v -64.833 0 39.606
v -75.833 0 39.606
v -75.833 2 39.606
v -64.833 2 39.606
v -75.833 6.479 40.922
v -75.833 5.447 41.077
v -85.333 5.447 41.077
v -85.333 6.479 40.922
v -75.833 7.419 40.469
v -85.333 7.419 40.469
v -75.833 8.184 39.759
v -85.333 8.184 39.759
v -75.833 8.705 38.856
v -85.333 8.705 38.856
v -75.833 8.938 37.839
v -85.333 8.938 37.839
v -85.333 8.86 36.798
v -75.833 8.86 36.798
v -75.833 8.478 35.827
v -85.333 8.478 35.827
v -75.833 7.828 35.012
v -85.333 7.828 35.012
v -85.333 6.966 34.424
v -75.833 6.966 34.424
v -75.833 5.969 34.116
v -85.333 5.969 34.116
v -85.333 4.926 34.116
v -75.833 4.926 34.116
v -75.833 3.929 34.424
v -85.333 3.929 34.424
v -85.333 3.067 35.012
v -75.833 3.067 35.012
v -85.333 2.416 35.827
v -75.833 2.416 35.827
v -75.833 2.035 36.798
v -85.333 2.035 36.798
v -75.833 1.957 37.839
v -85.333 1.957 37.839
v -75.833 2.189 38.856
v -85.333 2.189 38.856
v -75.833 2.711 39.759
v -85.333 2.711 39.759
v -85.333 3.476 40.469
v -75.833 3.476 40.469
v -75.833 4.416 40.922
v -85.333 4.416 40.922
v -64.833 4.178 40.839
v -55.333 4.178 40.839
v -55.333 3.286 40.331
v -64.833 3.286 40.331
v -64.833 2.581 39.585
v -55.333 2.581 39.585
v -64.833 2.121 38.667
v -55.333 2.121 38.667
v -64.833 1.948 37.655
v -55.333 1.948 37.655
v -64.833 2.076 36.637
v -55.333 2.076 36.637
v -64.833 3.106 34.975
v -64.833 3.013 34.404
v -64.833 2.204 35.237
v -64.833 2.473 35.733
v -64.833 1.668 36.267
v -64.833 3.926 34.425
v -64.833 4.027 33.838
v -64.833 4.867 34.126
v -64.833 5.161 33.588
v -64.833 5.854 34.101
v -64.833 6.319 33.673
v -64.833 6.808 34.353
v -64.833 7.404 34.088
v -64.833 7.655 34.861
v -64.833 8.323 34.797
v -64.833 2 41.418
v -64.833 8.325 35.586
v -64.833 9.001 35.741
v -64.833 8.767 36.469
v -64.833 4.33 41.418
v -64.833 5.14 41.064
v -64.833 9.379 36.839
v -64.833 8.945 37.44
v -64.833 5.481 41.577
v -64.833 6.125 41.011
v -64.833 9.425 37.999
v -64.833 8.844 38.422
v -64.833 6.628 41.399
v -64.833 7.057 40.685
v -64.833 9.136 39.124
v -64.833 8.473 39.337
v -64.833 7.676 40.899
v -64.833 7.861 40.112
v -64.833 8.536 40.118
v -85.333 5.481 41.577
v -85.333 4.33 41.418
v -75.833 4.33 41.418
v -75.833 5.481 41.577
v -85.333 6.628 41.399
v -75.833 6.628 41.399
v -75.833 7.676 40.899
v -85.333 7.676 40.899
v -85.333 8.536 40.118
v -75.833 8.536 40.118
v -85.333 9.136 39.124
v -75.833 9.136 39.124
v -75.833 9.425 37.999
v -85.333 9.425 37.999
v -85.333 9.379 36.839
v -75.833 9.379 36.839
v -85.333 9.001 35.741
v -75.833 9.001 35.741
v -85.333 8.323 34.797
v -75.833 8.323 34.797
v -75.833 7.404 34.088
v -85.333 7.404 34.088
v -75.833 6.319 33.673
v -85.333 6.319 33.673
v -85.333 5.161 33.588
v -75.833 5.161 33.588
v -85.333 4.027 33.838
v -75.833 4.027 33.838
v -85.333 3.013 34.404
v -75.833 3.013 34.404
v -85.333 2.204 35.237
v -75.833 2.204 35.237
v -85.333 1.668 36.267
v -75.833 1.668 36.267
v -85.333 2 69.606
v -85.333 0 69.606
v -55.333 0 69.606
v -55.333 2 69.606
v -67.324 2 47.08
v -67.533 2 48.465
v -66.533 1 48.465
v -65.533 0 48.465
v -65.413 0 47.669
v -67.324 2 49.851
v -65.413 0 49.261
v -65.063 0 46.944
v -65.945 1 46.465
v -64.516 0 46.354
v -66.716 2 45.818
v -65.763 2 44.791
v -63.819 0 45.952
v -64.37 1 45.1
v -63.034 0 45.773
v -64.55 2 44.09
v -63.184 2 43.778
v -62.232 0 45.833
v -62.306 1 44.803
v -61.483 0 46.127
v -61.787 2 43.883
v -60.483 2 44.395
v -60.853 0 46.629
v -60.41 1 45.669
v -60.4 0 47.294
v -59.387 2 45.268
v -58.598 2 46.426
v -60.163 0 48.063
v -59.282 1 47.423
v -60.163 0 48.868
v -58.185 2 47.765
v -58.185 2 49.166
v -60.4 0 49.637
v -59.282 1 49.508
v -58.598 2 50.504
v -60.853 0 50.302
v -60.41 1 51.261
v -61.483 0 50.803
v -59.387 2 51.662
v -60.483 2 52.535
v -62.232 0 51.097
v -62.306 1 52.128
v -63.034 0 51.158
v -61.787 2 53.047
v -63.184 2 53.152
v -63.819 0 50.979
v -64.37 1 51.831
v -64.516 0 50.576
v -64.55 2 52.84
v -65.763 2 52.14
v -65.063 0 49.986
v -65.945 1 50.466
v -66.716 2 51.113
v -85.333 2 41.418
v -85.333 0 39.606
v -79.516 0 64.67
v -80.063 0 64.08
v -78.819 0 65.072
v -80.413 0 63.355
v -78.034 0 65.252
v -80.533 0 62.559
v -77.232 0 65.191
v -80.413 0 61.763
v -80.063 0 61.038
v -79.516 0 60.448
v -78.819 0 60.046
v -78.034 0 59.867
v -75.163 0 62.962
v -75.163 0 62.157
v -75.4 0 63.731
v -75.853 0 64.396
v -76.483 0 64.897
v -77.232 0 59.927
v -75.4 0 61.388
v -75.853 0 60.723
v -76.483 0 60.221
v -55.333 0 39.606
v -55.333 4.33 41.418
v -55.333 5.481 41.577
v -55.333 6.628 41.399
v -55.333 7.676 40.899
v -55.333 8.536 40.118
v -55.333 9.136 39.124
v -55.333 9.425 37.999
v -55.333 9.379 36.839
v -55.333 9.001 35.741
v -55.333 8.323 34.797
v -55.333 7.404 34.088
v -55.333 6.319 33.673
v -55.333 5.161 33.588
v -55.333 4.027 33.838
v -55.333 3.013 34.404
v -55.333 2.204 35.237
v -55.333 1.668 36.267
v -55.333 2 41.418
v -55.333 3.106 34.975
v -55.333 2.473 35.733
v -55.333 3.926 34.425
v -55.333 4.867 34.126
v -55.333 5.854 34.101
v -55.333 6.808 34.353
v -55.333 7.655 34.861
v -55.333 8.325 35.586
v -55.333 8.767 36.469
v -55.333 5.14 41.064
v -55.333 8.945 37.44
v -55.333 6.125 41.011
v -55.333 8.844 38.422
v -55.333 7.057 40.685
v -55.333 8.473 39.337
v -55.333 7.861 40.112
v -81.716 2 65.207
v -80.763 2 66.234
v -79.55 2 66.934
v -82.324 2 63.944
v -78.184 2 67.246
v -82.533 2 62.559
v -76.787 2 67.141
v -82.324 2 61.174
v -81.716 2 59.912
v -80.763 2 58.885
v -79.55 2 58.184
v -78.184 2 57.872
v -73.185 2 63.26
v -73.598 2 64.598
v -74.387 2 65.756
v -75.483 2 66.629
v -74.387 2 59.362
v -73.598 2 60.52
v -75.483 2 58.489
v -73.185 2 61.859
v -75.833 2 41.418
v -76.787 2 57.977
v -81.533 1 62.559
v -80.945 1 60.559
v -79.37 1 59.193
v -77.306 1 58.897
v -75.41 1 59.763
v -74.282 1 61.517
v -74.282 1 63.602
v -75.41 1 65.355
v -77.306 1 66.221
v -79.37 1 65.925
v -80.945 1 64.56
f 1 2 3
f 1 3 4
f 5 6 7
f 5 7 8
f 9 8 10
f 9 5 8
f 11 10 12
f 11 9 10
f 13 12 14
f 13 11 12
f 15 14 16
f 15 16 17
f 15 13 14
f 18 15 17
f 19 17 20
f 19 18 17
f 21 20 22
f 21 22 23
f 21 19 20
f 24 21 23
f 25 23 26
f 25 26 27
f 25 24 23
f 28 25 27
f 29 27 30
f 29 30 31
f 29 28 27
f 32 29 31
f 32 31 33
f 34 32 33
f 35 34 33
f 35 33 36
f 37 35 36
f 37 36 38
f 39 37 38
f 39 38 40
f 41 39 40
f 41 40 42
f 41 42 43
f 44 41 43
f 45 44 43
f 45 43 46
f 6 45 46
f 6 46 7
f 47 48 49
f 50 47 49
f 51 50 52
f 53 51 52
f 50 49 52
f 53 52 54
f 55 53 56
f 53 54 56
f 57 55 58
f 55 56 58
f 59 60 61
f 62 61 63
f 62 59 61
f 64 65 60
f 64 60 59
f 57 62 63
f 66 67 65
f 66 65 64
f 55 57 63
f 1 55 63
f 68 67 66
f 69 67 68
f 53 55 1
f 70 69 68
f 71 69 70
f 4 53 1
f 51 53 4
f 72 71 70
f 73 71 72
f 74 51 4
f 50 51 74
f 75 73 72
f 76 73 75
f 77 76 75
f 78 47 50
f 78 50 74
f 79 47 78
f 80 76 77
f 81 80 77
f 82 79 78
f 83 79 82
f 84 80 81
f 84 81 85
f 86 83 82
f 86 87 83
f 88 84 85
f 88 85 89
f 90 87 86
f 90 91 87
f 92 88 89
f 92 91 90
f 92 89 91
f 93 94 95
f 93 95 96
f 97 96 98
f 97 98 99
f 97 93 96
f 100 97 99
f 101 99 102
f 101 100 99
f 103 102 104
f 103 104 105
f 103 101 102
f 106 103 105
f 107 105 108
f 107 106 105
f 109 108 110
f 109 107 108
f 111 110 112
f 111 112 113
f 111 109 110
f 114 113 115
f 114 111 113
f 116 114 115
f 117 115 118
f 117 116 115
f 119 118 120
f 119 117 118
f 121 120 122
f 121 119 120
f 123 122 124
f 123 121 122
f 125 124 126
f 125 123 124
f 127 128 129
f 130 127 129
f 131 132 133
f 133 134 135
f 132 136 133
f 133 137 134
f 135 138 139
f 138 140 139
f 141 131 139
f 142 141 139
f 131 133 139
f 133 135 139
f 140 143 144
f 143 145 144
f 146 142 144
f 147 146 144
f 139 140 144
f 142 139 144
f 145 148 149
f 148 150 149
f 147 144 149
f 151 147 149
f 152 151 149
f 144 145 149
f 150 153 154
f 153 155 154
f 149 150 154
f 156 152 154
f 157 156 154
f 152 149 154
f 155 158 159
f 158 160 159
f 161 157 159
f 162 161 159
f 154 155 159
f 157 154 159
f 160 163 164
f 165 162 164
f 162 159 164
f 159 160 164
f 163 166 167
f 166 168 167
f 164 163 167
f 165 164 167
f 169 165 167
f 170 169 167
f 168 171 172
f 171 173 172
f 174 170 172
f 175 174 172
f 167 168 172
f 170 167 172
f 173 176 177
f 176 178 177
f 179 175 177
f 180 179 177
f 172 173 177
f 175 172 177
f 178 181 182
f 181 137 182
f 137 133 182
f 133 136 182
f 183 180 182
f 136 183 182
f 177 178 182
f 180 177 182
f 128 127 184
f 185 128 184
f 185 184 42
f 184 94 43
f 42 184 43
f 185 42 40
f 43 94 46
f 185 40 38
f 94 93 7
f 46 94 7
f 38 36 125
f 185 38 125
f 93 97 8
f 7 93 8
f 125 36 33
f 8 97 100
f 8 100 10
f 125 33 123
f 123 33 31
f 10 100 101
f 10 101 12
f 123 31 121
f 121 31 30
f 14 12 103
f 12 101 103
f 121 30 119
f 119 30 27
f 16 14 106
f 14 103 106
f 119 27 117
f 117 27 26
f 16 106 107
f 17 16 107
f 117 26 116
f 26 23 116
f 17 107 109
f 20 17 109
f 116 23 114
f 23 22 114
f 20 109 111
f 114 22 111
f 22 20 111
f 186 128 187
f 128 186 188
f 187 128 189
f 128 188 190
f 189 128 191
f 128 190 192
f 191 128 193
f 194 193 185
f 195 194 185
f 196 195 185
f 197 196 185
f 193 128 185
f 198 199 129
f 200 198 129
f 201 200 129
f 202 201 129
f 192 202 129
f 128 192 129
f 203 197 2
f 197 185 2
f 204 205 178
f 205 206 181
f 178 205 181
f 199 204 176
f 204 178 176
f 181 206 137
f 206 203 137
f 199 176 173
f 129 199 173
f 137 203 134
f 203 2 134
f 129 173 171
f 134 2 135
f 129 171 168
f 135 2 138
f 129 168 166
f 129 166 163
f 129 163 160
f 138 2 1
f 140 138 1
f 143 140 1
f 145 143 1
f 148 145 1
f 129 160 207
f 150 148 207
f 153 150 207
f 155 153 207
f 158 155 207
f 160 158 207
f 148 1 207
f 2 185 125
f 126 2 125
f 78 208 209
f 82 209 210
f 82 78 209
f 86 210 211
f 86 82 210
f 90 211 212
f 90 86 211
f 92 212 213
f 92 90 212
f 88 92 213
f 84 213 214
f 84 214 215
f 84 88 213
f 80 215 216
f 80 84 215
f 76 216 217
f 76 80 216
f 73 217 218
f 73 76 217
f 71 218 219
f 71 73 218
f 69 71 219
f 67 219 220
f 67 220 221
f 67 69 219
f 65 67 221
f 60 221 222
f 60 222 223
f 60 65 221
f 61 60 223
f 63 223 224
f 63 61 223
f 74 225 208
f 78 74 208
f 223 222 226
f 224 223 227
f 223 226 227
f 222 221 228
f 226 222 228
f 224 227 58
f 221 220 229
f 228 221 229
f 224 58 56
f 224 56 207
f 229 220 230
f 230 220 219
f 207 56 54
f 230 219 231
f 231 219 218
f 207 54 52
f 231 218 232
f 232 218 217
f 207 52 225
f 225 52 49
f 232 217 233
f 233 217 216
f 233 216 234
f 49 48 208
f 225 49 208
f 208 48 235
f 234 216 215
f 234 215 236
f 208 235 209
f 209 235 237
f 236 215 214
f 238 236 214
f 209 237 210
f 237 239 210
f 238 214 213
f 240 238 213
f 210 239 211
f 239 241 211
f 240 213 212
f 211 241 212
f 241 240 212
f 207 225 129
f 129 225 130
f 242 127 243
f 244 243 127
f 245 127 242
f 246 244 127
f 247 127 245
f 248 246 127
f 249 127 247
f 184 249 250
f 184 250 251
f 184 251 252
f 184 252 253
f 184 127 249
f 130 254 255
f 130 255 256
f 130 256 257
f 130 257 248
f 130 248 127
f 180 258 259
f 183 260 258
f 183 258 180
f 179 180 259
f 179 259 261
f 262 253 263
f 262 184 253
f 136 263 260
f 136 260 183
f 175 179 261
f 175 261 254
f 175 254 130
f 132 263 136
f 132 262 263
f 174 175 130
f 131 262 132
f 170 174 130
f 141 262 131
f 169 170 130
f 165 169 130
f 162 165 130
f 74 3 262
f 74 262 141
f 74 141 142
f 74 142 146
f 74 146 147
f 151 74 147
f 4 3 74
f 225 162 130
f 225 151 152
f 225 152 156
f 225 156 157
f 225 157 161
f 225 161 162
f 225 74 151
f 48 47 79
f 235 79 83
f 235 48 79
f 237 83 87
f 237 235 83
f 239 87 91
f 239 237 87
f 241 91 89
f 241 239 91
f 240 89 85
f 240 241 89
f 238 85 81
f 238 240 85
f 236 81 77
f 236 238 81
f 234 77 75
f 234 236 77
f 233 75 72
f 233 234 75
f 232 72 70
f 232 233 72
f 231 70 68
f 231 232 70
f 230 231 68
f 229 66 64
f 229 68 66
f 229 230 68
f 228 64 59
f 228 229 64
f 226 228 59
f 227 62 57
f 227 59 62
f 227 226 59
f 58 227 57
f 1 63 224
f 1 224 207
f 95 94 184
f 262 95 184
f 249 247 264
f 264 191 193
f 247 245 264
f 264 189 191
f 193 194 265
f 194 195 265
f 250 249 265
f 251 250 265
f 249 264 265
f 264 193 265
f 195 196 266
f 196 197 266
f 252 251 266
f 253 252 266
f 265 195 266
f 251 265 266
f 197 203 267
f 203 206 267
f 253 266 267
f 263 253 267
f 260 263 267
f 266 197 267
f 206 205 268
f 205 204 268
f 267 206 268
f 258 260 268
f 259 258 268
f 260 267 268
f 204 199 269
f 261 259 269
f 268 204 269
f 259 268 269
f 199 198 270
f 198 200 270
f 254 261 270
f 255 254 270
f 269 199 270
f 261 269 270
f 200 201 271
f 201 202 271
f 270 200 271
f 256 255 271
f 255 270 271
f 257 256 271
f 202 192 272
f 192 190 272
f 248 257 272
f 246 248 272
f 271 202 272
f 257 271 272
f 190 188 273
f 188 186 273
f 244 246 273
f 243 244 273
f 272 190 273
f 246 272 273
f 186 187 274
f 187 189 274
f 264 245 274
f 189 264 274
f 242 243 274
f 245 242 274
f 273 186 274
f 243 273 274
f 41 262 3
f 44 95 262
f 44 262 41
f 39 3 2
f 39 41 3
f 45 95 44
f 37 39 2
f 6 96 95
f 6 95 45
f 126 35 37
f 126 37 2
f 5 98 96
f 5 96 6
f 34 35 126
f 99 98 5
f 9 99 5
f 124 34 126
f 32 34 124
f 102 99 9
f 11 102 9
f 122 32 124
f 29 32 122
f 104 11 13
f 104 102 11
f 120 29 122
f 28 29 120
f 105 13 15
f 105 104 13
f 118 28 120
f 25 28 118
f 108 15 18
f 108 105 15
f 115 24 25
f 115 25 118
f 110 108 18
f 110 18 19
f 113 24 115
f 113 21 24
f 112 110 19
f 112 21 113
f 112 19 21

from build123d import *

# Parameters (mm, degrees)
SKETCH_1_W                  = 30
SKETCH_1_H                  = 30
EXTRUDE_1_DEPTH             = 2
SKETCH_2_R                  = 4
EXTRUDE_2_DEPTH             = 9.5
SKETCH_3_R                  = 4
EXTRUDE_3_DEPTH             = 9.5
CUT_EXTRUDE_START           = -30
SKETCH_4_R                  = 3.5
CUT_EXTRUDE_1_DEPTH         = 30
EXTRUDE_4_DEPTH             = 9.5
EXTRUDE_START               = -9.5
EXTRUDE_5_DEPTH             = 9.5
HOLE_WIZARD_M41_D           = 4.5
HOLE_WIZARD_M41_DEPTH       = 21
HOLE_WIZARD_M41_CSINK_D     = 9.4
HOLE_WIZARD_M41_CSINK_ANGLE = 90
HOLE_WIZARD_M41_TIP         = 1.351936393


with BuildPart() as part:
    # Эскиз1 → Бобышка-Вытянуть1 (new body)
    with BuildSketch(Plane(origin=(0, 0, 0), x_dir=(1, 0, 0), z_dir=(0, 1, 0))):
        with Locations((-70.332590066, -54.606104746)):
            Rectangle(SKETCH_1_W, SKETCH_1_H)
    extrude(amount=EXTRUDE_1_DEPTH)



with BuildPart() as body_2:
    # Эскиз2 → Бобышка-Вытянуть2 (new body)
    with BuildSketch(Plane.ZY.offset(85.332590066)):
        with Locations((37.577272985, 5.447294836)):
            Circle(SKETCH_2_R)
    extrude(amount=-EXTRUDE_2_DEPTH)


with BuildPart() as body_3:
    # Эскиз3 → Бобышка-Вытянуть3 (new body)
    with BuildSketch(Plane.ZY.offset(64.832590066)):
        with Locations((37.577272985, 5.447294836)):
            Circle(SKETCH_3_R)
    extrude(amount=-EXTRUDE_3_DEPTH)


with BuildPart() as cut_extrude_1_tool:
    # Эскиз4 → Вырез-Вытянуть1 (new body)
    with BuildSketch(Plane.ZY.offset(85.332590066).offset(CUT_EXTRUDE_START)):
        with Locations((37.577272985, 5.447294836)):
            Circle(SKETCH_4_R)
    extrude(amount=CUT_EXTRUDE_1_DEPTH)


with BuildPart() as body_2_1:
    add(body_2.part)

    # Вырез-Вытянуть1: cut by cut_extrude_1_tool
    add(cut_extrude_1_tool.part, mode=Mode.SUBTRACT)


with BuildPart() as body_3_1:
    add(body_3.part)

    # Вырез-Вытянуть1: cut by cut_extrude_1_tool
    add(cut_extrude_1_tool.part, mode=Mode.SUBTRACT)


with BuildPart() as part_1:
    add(part.part)

    add(body_2_1.part)  # Бобышка-Вытянуть4 merges body 2
    # Эскиз5 → Бобышка-Вытянуть4 (add)
    with BuildSketch(Plane.ZY.offset(85.332590066)):
        with BuildLine():
            Line((39.606104746, 0), (36.267042135, 1.667970145))
            ThreePointArc((36.267042135, 1.667970145), (39.413946145, 1.89389763), (41.418204347, 4.330493028))
            Line((41.418204347, 4.330493028), (41.418204347, 0))
            Line((41.418204347, 0), (39.606104746, 0))
        make_face()
    extrude(amount=-EXTRUDE_4_DEPTH)


    add(body_3_1.part)  # Бобышка-Вытянуть5 merges body 3
    # Эскиз6 → Бобышка-Вытянуть5 (add)
    with BuildSketch(Plane.ZY.offset(64.832590066).offset(EXTRUDE_START)):
        with BuildLine():
            Line((41.418204347, 2), (41.418204347, 4.330493028))
            Line((41.418204347, 4.330493028), (40.83906741, 4.178162405))
            ThreePointArc((40.83906741, 4.178162405), (39.143105824, 2.317092363), (36.636762804, 2.076027923))
            Line((36.636762804, 2.076027923), (36.267042135, 1.667970145))
            Line((36.267042135, 1.667970145), (39.606104746, 0))
            Line((39.606104746, 0), (41.418204347, 2))
        make_face()
    extrude(amount=EXTRUDE_5_DEPTH)

    # Зенковка для  винта с плоской головкой M41
    with Locations(Plane(origin=(0, 2, 0), x_dir=(1, 0, 0), z_dir=(0, 1, 0))):
        with Locations((-62.832590066, -48.465179446), (-77.832590066, -62.559129646)):
            CounterSinkHole(HOLE_WIZARD_M41_D / 2, HOLE_WIZARD_M41_CSINK_D / 2, depth=HOLE_WIZARD_M41_DEPTH, counter_sink_angle=HOLE_WIZARD_M41_CSINK_ANGLE)
            with Locations((0, 0, -(HOLE_WIZARD_M41_DEPTH + HOLE_WIZARD_M41_TIP / 2))):  # 118° drill point
                Cone(0, HOLE_WIZARD_M41_D / 2, HOLE_WIZARD_M41_TIP, mode=Mode.SUBTRACT)


solid = part_1.part
